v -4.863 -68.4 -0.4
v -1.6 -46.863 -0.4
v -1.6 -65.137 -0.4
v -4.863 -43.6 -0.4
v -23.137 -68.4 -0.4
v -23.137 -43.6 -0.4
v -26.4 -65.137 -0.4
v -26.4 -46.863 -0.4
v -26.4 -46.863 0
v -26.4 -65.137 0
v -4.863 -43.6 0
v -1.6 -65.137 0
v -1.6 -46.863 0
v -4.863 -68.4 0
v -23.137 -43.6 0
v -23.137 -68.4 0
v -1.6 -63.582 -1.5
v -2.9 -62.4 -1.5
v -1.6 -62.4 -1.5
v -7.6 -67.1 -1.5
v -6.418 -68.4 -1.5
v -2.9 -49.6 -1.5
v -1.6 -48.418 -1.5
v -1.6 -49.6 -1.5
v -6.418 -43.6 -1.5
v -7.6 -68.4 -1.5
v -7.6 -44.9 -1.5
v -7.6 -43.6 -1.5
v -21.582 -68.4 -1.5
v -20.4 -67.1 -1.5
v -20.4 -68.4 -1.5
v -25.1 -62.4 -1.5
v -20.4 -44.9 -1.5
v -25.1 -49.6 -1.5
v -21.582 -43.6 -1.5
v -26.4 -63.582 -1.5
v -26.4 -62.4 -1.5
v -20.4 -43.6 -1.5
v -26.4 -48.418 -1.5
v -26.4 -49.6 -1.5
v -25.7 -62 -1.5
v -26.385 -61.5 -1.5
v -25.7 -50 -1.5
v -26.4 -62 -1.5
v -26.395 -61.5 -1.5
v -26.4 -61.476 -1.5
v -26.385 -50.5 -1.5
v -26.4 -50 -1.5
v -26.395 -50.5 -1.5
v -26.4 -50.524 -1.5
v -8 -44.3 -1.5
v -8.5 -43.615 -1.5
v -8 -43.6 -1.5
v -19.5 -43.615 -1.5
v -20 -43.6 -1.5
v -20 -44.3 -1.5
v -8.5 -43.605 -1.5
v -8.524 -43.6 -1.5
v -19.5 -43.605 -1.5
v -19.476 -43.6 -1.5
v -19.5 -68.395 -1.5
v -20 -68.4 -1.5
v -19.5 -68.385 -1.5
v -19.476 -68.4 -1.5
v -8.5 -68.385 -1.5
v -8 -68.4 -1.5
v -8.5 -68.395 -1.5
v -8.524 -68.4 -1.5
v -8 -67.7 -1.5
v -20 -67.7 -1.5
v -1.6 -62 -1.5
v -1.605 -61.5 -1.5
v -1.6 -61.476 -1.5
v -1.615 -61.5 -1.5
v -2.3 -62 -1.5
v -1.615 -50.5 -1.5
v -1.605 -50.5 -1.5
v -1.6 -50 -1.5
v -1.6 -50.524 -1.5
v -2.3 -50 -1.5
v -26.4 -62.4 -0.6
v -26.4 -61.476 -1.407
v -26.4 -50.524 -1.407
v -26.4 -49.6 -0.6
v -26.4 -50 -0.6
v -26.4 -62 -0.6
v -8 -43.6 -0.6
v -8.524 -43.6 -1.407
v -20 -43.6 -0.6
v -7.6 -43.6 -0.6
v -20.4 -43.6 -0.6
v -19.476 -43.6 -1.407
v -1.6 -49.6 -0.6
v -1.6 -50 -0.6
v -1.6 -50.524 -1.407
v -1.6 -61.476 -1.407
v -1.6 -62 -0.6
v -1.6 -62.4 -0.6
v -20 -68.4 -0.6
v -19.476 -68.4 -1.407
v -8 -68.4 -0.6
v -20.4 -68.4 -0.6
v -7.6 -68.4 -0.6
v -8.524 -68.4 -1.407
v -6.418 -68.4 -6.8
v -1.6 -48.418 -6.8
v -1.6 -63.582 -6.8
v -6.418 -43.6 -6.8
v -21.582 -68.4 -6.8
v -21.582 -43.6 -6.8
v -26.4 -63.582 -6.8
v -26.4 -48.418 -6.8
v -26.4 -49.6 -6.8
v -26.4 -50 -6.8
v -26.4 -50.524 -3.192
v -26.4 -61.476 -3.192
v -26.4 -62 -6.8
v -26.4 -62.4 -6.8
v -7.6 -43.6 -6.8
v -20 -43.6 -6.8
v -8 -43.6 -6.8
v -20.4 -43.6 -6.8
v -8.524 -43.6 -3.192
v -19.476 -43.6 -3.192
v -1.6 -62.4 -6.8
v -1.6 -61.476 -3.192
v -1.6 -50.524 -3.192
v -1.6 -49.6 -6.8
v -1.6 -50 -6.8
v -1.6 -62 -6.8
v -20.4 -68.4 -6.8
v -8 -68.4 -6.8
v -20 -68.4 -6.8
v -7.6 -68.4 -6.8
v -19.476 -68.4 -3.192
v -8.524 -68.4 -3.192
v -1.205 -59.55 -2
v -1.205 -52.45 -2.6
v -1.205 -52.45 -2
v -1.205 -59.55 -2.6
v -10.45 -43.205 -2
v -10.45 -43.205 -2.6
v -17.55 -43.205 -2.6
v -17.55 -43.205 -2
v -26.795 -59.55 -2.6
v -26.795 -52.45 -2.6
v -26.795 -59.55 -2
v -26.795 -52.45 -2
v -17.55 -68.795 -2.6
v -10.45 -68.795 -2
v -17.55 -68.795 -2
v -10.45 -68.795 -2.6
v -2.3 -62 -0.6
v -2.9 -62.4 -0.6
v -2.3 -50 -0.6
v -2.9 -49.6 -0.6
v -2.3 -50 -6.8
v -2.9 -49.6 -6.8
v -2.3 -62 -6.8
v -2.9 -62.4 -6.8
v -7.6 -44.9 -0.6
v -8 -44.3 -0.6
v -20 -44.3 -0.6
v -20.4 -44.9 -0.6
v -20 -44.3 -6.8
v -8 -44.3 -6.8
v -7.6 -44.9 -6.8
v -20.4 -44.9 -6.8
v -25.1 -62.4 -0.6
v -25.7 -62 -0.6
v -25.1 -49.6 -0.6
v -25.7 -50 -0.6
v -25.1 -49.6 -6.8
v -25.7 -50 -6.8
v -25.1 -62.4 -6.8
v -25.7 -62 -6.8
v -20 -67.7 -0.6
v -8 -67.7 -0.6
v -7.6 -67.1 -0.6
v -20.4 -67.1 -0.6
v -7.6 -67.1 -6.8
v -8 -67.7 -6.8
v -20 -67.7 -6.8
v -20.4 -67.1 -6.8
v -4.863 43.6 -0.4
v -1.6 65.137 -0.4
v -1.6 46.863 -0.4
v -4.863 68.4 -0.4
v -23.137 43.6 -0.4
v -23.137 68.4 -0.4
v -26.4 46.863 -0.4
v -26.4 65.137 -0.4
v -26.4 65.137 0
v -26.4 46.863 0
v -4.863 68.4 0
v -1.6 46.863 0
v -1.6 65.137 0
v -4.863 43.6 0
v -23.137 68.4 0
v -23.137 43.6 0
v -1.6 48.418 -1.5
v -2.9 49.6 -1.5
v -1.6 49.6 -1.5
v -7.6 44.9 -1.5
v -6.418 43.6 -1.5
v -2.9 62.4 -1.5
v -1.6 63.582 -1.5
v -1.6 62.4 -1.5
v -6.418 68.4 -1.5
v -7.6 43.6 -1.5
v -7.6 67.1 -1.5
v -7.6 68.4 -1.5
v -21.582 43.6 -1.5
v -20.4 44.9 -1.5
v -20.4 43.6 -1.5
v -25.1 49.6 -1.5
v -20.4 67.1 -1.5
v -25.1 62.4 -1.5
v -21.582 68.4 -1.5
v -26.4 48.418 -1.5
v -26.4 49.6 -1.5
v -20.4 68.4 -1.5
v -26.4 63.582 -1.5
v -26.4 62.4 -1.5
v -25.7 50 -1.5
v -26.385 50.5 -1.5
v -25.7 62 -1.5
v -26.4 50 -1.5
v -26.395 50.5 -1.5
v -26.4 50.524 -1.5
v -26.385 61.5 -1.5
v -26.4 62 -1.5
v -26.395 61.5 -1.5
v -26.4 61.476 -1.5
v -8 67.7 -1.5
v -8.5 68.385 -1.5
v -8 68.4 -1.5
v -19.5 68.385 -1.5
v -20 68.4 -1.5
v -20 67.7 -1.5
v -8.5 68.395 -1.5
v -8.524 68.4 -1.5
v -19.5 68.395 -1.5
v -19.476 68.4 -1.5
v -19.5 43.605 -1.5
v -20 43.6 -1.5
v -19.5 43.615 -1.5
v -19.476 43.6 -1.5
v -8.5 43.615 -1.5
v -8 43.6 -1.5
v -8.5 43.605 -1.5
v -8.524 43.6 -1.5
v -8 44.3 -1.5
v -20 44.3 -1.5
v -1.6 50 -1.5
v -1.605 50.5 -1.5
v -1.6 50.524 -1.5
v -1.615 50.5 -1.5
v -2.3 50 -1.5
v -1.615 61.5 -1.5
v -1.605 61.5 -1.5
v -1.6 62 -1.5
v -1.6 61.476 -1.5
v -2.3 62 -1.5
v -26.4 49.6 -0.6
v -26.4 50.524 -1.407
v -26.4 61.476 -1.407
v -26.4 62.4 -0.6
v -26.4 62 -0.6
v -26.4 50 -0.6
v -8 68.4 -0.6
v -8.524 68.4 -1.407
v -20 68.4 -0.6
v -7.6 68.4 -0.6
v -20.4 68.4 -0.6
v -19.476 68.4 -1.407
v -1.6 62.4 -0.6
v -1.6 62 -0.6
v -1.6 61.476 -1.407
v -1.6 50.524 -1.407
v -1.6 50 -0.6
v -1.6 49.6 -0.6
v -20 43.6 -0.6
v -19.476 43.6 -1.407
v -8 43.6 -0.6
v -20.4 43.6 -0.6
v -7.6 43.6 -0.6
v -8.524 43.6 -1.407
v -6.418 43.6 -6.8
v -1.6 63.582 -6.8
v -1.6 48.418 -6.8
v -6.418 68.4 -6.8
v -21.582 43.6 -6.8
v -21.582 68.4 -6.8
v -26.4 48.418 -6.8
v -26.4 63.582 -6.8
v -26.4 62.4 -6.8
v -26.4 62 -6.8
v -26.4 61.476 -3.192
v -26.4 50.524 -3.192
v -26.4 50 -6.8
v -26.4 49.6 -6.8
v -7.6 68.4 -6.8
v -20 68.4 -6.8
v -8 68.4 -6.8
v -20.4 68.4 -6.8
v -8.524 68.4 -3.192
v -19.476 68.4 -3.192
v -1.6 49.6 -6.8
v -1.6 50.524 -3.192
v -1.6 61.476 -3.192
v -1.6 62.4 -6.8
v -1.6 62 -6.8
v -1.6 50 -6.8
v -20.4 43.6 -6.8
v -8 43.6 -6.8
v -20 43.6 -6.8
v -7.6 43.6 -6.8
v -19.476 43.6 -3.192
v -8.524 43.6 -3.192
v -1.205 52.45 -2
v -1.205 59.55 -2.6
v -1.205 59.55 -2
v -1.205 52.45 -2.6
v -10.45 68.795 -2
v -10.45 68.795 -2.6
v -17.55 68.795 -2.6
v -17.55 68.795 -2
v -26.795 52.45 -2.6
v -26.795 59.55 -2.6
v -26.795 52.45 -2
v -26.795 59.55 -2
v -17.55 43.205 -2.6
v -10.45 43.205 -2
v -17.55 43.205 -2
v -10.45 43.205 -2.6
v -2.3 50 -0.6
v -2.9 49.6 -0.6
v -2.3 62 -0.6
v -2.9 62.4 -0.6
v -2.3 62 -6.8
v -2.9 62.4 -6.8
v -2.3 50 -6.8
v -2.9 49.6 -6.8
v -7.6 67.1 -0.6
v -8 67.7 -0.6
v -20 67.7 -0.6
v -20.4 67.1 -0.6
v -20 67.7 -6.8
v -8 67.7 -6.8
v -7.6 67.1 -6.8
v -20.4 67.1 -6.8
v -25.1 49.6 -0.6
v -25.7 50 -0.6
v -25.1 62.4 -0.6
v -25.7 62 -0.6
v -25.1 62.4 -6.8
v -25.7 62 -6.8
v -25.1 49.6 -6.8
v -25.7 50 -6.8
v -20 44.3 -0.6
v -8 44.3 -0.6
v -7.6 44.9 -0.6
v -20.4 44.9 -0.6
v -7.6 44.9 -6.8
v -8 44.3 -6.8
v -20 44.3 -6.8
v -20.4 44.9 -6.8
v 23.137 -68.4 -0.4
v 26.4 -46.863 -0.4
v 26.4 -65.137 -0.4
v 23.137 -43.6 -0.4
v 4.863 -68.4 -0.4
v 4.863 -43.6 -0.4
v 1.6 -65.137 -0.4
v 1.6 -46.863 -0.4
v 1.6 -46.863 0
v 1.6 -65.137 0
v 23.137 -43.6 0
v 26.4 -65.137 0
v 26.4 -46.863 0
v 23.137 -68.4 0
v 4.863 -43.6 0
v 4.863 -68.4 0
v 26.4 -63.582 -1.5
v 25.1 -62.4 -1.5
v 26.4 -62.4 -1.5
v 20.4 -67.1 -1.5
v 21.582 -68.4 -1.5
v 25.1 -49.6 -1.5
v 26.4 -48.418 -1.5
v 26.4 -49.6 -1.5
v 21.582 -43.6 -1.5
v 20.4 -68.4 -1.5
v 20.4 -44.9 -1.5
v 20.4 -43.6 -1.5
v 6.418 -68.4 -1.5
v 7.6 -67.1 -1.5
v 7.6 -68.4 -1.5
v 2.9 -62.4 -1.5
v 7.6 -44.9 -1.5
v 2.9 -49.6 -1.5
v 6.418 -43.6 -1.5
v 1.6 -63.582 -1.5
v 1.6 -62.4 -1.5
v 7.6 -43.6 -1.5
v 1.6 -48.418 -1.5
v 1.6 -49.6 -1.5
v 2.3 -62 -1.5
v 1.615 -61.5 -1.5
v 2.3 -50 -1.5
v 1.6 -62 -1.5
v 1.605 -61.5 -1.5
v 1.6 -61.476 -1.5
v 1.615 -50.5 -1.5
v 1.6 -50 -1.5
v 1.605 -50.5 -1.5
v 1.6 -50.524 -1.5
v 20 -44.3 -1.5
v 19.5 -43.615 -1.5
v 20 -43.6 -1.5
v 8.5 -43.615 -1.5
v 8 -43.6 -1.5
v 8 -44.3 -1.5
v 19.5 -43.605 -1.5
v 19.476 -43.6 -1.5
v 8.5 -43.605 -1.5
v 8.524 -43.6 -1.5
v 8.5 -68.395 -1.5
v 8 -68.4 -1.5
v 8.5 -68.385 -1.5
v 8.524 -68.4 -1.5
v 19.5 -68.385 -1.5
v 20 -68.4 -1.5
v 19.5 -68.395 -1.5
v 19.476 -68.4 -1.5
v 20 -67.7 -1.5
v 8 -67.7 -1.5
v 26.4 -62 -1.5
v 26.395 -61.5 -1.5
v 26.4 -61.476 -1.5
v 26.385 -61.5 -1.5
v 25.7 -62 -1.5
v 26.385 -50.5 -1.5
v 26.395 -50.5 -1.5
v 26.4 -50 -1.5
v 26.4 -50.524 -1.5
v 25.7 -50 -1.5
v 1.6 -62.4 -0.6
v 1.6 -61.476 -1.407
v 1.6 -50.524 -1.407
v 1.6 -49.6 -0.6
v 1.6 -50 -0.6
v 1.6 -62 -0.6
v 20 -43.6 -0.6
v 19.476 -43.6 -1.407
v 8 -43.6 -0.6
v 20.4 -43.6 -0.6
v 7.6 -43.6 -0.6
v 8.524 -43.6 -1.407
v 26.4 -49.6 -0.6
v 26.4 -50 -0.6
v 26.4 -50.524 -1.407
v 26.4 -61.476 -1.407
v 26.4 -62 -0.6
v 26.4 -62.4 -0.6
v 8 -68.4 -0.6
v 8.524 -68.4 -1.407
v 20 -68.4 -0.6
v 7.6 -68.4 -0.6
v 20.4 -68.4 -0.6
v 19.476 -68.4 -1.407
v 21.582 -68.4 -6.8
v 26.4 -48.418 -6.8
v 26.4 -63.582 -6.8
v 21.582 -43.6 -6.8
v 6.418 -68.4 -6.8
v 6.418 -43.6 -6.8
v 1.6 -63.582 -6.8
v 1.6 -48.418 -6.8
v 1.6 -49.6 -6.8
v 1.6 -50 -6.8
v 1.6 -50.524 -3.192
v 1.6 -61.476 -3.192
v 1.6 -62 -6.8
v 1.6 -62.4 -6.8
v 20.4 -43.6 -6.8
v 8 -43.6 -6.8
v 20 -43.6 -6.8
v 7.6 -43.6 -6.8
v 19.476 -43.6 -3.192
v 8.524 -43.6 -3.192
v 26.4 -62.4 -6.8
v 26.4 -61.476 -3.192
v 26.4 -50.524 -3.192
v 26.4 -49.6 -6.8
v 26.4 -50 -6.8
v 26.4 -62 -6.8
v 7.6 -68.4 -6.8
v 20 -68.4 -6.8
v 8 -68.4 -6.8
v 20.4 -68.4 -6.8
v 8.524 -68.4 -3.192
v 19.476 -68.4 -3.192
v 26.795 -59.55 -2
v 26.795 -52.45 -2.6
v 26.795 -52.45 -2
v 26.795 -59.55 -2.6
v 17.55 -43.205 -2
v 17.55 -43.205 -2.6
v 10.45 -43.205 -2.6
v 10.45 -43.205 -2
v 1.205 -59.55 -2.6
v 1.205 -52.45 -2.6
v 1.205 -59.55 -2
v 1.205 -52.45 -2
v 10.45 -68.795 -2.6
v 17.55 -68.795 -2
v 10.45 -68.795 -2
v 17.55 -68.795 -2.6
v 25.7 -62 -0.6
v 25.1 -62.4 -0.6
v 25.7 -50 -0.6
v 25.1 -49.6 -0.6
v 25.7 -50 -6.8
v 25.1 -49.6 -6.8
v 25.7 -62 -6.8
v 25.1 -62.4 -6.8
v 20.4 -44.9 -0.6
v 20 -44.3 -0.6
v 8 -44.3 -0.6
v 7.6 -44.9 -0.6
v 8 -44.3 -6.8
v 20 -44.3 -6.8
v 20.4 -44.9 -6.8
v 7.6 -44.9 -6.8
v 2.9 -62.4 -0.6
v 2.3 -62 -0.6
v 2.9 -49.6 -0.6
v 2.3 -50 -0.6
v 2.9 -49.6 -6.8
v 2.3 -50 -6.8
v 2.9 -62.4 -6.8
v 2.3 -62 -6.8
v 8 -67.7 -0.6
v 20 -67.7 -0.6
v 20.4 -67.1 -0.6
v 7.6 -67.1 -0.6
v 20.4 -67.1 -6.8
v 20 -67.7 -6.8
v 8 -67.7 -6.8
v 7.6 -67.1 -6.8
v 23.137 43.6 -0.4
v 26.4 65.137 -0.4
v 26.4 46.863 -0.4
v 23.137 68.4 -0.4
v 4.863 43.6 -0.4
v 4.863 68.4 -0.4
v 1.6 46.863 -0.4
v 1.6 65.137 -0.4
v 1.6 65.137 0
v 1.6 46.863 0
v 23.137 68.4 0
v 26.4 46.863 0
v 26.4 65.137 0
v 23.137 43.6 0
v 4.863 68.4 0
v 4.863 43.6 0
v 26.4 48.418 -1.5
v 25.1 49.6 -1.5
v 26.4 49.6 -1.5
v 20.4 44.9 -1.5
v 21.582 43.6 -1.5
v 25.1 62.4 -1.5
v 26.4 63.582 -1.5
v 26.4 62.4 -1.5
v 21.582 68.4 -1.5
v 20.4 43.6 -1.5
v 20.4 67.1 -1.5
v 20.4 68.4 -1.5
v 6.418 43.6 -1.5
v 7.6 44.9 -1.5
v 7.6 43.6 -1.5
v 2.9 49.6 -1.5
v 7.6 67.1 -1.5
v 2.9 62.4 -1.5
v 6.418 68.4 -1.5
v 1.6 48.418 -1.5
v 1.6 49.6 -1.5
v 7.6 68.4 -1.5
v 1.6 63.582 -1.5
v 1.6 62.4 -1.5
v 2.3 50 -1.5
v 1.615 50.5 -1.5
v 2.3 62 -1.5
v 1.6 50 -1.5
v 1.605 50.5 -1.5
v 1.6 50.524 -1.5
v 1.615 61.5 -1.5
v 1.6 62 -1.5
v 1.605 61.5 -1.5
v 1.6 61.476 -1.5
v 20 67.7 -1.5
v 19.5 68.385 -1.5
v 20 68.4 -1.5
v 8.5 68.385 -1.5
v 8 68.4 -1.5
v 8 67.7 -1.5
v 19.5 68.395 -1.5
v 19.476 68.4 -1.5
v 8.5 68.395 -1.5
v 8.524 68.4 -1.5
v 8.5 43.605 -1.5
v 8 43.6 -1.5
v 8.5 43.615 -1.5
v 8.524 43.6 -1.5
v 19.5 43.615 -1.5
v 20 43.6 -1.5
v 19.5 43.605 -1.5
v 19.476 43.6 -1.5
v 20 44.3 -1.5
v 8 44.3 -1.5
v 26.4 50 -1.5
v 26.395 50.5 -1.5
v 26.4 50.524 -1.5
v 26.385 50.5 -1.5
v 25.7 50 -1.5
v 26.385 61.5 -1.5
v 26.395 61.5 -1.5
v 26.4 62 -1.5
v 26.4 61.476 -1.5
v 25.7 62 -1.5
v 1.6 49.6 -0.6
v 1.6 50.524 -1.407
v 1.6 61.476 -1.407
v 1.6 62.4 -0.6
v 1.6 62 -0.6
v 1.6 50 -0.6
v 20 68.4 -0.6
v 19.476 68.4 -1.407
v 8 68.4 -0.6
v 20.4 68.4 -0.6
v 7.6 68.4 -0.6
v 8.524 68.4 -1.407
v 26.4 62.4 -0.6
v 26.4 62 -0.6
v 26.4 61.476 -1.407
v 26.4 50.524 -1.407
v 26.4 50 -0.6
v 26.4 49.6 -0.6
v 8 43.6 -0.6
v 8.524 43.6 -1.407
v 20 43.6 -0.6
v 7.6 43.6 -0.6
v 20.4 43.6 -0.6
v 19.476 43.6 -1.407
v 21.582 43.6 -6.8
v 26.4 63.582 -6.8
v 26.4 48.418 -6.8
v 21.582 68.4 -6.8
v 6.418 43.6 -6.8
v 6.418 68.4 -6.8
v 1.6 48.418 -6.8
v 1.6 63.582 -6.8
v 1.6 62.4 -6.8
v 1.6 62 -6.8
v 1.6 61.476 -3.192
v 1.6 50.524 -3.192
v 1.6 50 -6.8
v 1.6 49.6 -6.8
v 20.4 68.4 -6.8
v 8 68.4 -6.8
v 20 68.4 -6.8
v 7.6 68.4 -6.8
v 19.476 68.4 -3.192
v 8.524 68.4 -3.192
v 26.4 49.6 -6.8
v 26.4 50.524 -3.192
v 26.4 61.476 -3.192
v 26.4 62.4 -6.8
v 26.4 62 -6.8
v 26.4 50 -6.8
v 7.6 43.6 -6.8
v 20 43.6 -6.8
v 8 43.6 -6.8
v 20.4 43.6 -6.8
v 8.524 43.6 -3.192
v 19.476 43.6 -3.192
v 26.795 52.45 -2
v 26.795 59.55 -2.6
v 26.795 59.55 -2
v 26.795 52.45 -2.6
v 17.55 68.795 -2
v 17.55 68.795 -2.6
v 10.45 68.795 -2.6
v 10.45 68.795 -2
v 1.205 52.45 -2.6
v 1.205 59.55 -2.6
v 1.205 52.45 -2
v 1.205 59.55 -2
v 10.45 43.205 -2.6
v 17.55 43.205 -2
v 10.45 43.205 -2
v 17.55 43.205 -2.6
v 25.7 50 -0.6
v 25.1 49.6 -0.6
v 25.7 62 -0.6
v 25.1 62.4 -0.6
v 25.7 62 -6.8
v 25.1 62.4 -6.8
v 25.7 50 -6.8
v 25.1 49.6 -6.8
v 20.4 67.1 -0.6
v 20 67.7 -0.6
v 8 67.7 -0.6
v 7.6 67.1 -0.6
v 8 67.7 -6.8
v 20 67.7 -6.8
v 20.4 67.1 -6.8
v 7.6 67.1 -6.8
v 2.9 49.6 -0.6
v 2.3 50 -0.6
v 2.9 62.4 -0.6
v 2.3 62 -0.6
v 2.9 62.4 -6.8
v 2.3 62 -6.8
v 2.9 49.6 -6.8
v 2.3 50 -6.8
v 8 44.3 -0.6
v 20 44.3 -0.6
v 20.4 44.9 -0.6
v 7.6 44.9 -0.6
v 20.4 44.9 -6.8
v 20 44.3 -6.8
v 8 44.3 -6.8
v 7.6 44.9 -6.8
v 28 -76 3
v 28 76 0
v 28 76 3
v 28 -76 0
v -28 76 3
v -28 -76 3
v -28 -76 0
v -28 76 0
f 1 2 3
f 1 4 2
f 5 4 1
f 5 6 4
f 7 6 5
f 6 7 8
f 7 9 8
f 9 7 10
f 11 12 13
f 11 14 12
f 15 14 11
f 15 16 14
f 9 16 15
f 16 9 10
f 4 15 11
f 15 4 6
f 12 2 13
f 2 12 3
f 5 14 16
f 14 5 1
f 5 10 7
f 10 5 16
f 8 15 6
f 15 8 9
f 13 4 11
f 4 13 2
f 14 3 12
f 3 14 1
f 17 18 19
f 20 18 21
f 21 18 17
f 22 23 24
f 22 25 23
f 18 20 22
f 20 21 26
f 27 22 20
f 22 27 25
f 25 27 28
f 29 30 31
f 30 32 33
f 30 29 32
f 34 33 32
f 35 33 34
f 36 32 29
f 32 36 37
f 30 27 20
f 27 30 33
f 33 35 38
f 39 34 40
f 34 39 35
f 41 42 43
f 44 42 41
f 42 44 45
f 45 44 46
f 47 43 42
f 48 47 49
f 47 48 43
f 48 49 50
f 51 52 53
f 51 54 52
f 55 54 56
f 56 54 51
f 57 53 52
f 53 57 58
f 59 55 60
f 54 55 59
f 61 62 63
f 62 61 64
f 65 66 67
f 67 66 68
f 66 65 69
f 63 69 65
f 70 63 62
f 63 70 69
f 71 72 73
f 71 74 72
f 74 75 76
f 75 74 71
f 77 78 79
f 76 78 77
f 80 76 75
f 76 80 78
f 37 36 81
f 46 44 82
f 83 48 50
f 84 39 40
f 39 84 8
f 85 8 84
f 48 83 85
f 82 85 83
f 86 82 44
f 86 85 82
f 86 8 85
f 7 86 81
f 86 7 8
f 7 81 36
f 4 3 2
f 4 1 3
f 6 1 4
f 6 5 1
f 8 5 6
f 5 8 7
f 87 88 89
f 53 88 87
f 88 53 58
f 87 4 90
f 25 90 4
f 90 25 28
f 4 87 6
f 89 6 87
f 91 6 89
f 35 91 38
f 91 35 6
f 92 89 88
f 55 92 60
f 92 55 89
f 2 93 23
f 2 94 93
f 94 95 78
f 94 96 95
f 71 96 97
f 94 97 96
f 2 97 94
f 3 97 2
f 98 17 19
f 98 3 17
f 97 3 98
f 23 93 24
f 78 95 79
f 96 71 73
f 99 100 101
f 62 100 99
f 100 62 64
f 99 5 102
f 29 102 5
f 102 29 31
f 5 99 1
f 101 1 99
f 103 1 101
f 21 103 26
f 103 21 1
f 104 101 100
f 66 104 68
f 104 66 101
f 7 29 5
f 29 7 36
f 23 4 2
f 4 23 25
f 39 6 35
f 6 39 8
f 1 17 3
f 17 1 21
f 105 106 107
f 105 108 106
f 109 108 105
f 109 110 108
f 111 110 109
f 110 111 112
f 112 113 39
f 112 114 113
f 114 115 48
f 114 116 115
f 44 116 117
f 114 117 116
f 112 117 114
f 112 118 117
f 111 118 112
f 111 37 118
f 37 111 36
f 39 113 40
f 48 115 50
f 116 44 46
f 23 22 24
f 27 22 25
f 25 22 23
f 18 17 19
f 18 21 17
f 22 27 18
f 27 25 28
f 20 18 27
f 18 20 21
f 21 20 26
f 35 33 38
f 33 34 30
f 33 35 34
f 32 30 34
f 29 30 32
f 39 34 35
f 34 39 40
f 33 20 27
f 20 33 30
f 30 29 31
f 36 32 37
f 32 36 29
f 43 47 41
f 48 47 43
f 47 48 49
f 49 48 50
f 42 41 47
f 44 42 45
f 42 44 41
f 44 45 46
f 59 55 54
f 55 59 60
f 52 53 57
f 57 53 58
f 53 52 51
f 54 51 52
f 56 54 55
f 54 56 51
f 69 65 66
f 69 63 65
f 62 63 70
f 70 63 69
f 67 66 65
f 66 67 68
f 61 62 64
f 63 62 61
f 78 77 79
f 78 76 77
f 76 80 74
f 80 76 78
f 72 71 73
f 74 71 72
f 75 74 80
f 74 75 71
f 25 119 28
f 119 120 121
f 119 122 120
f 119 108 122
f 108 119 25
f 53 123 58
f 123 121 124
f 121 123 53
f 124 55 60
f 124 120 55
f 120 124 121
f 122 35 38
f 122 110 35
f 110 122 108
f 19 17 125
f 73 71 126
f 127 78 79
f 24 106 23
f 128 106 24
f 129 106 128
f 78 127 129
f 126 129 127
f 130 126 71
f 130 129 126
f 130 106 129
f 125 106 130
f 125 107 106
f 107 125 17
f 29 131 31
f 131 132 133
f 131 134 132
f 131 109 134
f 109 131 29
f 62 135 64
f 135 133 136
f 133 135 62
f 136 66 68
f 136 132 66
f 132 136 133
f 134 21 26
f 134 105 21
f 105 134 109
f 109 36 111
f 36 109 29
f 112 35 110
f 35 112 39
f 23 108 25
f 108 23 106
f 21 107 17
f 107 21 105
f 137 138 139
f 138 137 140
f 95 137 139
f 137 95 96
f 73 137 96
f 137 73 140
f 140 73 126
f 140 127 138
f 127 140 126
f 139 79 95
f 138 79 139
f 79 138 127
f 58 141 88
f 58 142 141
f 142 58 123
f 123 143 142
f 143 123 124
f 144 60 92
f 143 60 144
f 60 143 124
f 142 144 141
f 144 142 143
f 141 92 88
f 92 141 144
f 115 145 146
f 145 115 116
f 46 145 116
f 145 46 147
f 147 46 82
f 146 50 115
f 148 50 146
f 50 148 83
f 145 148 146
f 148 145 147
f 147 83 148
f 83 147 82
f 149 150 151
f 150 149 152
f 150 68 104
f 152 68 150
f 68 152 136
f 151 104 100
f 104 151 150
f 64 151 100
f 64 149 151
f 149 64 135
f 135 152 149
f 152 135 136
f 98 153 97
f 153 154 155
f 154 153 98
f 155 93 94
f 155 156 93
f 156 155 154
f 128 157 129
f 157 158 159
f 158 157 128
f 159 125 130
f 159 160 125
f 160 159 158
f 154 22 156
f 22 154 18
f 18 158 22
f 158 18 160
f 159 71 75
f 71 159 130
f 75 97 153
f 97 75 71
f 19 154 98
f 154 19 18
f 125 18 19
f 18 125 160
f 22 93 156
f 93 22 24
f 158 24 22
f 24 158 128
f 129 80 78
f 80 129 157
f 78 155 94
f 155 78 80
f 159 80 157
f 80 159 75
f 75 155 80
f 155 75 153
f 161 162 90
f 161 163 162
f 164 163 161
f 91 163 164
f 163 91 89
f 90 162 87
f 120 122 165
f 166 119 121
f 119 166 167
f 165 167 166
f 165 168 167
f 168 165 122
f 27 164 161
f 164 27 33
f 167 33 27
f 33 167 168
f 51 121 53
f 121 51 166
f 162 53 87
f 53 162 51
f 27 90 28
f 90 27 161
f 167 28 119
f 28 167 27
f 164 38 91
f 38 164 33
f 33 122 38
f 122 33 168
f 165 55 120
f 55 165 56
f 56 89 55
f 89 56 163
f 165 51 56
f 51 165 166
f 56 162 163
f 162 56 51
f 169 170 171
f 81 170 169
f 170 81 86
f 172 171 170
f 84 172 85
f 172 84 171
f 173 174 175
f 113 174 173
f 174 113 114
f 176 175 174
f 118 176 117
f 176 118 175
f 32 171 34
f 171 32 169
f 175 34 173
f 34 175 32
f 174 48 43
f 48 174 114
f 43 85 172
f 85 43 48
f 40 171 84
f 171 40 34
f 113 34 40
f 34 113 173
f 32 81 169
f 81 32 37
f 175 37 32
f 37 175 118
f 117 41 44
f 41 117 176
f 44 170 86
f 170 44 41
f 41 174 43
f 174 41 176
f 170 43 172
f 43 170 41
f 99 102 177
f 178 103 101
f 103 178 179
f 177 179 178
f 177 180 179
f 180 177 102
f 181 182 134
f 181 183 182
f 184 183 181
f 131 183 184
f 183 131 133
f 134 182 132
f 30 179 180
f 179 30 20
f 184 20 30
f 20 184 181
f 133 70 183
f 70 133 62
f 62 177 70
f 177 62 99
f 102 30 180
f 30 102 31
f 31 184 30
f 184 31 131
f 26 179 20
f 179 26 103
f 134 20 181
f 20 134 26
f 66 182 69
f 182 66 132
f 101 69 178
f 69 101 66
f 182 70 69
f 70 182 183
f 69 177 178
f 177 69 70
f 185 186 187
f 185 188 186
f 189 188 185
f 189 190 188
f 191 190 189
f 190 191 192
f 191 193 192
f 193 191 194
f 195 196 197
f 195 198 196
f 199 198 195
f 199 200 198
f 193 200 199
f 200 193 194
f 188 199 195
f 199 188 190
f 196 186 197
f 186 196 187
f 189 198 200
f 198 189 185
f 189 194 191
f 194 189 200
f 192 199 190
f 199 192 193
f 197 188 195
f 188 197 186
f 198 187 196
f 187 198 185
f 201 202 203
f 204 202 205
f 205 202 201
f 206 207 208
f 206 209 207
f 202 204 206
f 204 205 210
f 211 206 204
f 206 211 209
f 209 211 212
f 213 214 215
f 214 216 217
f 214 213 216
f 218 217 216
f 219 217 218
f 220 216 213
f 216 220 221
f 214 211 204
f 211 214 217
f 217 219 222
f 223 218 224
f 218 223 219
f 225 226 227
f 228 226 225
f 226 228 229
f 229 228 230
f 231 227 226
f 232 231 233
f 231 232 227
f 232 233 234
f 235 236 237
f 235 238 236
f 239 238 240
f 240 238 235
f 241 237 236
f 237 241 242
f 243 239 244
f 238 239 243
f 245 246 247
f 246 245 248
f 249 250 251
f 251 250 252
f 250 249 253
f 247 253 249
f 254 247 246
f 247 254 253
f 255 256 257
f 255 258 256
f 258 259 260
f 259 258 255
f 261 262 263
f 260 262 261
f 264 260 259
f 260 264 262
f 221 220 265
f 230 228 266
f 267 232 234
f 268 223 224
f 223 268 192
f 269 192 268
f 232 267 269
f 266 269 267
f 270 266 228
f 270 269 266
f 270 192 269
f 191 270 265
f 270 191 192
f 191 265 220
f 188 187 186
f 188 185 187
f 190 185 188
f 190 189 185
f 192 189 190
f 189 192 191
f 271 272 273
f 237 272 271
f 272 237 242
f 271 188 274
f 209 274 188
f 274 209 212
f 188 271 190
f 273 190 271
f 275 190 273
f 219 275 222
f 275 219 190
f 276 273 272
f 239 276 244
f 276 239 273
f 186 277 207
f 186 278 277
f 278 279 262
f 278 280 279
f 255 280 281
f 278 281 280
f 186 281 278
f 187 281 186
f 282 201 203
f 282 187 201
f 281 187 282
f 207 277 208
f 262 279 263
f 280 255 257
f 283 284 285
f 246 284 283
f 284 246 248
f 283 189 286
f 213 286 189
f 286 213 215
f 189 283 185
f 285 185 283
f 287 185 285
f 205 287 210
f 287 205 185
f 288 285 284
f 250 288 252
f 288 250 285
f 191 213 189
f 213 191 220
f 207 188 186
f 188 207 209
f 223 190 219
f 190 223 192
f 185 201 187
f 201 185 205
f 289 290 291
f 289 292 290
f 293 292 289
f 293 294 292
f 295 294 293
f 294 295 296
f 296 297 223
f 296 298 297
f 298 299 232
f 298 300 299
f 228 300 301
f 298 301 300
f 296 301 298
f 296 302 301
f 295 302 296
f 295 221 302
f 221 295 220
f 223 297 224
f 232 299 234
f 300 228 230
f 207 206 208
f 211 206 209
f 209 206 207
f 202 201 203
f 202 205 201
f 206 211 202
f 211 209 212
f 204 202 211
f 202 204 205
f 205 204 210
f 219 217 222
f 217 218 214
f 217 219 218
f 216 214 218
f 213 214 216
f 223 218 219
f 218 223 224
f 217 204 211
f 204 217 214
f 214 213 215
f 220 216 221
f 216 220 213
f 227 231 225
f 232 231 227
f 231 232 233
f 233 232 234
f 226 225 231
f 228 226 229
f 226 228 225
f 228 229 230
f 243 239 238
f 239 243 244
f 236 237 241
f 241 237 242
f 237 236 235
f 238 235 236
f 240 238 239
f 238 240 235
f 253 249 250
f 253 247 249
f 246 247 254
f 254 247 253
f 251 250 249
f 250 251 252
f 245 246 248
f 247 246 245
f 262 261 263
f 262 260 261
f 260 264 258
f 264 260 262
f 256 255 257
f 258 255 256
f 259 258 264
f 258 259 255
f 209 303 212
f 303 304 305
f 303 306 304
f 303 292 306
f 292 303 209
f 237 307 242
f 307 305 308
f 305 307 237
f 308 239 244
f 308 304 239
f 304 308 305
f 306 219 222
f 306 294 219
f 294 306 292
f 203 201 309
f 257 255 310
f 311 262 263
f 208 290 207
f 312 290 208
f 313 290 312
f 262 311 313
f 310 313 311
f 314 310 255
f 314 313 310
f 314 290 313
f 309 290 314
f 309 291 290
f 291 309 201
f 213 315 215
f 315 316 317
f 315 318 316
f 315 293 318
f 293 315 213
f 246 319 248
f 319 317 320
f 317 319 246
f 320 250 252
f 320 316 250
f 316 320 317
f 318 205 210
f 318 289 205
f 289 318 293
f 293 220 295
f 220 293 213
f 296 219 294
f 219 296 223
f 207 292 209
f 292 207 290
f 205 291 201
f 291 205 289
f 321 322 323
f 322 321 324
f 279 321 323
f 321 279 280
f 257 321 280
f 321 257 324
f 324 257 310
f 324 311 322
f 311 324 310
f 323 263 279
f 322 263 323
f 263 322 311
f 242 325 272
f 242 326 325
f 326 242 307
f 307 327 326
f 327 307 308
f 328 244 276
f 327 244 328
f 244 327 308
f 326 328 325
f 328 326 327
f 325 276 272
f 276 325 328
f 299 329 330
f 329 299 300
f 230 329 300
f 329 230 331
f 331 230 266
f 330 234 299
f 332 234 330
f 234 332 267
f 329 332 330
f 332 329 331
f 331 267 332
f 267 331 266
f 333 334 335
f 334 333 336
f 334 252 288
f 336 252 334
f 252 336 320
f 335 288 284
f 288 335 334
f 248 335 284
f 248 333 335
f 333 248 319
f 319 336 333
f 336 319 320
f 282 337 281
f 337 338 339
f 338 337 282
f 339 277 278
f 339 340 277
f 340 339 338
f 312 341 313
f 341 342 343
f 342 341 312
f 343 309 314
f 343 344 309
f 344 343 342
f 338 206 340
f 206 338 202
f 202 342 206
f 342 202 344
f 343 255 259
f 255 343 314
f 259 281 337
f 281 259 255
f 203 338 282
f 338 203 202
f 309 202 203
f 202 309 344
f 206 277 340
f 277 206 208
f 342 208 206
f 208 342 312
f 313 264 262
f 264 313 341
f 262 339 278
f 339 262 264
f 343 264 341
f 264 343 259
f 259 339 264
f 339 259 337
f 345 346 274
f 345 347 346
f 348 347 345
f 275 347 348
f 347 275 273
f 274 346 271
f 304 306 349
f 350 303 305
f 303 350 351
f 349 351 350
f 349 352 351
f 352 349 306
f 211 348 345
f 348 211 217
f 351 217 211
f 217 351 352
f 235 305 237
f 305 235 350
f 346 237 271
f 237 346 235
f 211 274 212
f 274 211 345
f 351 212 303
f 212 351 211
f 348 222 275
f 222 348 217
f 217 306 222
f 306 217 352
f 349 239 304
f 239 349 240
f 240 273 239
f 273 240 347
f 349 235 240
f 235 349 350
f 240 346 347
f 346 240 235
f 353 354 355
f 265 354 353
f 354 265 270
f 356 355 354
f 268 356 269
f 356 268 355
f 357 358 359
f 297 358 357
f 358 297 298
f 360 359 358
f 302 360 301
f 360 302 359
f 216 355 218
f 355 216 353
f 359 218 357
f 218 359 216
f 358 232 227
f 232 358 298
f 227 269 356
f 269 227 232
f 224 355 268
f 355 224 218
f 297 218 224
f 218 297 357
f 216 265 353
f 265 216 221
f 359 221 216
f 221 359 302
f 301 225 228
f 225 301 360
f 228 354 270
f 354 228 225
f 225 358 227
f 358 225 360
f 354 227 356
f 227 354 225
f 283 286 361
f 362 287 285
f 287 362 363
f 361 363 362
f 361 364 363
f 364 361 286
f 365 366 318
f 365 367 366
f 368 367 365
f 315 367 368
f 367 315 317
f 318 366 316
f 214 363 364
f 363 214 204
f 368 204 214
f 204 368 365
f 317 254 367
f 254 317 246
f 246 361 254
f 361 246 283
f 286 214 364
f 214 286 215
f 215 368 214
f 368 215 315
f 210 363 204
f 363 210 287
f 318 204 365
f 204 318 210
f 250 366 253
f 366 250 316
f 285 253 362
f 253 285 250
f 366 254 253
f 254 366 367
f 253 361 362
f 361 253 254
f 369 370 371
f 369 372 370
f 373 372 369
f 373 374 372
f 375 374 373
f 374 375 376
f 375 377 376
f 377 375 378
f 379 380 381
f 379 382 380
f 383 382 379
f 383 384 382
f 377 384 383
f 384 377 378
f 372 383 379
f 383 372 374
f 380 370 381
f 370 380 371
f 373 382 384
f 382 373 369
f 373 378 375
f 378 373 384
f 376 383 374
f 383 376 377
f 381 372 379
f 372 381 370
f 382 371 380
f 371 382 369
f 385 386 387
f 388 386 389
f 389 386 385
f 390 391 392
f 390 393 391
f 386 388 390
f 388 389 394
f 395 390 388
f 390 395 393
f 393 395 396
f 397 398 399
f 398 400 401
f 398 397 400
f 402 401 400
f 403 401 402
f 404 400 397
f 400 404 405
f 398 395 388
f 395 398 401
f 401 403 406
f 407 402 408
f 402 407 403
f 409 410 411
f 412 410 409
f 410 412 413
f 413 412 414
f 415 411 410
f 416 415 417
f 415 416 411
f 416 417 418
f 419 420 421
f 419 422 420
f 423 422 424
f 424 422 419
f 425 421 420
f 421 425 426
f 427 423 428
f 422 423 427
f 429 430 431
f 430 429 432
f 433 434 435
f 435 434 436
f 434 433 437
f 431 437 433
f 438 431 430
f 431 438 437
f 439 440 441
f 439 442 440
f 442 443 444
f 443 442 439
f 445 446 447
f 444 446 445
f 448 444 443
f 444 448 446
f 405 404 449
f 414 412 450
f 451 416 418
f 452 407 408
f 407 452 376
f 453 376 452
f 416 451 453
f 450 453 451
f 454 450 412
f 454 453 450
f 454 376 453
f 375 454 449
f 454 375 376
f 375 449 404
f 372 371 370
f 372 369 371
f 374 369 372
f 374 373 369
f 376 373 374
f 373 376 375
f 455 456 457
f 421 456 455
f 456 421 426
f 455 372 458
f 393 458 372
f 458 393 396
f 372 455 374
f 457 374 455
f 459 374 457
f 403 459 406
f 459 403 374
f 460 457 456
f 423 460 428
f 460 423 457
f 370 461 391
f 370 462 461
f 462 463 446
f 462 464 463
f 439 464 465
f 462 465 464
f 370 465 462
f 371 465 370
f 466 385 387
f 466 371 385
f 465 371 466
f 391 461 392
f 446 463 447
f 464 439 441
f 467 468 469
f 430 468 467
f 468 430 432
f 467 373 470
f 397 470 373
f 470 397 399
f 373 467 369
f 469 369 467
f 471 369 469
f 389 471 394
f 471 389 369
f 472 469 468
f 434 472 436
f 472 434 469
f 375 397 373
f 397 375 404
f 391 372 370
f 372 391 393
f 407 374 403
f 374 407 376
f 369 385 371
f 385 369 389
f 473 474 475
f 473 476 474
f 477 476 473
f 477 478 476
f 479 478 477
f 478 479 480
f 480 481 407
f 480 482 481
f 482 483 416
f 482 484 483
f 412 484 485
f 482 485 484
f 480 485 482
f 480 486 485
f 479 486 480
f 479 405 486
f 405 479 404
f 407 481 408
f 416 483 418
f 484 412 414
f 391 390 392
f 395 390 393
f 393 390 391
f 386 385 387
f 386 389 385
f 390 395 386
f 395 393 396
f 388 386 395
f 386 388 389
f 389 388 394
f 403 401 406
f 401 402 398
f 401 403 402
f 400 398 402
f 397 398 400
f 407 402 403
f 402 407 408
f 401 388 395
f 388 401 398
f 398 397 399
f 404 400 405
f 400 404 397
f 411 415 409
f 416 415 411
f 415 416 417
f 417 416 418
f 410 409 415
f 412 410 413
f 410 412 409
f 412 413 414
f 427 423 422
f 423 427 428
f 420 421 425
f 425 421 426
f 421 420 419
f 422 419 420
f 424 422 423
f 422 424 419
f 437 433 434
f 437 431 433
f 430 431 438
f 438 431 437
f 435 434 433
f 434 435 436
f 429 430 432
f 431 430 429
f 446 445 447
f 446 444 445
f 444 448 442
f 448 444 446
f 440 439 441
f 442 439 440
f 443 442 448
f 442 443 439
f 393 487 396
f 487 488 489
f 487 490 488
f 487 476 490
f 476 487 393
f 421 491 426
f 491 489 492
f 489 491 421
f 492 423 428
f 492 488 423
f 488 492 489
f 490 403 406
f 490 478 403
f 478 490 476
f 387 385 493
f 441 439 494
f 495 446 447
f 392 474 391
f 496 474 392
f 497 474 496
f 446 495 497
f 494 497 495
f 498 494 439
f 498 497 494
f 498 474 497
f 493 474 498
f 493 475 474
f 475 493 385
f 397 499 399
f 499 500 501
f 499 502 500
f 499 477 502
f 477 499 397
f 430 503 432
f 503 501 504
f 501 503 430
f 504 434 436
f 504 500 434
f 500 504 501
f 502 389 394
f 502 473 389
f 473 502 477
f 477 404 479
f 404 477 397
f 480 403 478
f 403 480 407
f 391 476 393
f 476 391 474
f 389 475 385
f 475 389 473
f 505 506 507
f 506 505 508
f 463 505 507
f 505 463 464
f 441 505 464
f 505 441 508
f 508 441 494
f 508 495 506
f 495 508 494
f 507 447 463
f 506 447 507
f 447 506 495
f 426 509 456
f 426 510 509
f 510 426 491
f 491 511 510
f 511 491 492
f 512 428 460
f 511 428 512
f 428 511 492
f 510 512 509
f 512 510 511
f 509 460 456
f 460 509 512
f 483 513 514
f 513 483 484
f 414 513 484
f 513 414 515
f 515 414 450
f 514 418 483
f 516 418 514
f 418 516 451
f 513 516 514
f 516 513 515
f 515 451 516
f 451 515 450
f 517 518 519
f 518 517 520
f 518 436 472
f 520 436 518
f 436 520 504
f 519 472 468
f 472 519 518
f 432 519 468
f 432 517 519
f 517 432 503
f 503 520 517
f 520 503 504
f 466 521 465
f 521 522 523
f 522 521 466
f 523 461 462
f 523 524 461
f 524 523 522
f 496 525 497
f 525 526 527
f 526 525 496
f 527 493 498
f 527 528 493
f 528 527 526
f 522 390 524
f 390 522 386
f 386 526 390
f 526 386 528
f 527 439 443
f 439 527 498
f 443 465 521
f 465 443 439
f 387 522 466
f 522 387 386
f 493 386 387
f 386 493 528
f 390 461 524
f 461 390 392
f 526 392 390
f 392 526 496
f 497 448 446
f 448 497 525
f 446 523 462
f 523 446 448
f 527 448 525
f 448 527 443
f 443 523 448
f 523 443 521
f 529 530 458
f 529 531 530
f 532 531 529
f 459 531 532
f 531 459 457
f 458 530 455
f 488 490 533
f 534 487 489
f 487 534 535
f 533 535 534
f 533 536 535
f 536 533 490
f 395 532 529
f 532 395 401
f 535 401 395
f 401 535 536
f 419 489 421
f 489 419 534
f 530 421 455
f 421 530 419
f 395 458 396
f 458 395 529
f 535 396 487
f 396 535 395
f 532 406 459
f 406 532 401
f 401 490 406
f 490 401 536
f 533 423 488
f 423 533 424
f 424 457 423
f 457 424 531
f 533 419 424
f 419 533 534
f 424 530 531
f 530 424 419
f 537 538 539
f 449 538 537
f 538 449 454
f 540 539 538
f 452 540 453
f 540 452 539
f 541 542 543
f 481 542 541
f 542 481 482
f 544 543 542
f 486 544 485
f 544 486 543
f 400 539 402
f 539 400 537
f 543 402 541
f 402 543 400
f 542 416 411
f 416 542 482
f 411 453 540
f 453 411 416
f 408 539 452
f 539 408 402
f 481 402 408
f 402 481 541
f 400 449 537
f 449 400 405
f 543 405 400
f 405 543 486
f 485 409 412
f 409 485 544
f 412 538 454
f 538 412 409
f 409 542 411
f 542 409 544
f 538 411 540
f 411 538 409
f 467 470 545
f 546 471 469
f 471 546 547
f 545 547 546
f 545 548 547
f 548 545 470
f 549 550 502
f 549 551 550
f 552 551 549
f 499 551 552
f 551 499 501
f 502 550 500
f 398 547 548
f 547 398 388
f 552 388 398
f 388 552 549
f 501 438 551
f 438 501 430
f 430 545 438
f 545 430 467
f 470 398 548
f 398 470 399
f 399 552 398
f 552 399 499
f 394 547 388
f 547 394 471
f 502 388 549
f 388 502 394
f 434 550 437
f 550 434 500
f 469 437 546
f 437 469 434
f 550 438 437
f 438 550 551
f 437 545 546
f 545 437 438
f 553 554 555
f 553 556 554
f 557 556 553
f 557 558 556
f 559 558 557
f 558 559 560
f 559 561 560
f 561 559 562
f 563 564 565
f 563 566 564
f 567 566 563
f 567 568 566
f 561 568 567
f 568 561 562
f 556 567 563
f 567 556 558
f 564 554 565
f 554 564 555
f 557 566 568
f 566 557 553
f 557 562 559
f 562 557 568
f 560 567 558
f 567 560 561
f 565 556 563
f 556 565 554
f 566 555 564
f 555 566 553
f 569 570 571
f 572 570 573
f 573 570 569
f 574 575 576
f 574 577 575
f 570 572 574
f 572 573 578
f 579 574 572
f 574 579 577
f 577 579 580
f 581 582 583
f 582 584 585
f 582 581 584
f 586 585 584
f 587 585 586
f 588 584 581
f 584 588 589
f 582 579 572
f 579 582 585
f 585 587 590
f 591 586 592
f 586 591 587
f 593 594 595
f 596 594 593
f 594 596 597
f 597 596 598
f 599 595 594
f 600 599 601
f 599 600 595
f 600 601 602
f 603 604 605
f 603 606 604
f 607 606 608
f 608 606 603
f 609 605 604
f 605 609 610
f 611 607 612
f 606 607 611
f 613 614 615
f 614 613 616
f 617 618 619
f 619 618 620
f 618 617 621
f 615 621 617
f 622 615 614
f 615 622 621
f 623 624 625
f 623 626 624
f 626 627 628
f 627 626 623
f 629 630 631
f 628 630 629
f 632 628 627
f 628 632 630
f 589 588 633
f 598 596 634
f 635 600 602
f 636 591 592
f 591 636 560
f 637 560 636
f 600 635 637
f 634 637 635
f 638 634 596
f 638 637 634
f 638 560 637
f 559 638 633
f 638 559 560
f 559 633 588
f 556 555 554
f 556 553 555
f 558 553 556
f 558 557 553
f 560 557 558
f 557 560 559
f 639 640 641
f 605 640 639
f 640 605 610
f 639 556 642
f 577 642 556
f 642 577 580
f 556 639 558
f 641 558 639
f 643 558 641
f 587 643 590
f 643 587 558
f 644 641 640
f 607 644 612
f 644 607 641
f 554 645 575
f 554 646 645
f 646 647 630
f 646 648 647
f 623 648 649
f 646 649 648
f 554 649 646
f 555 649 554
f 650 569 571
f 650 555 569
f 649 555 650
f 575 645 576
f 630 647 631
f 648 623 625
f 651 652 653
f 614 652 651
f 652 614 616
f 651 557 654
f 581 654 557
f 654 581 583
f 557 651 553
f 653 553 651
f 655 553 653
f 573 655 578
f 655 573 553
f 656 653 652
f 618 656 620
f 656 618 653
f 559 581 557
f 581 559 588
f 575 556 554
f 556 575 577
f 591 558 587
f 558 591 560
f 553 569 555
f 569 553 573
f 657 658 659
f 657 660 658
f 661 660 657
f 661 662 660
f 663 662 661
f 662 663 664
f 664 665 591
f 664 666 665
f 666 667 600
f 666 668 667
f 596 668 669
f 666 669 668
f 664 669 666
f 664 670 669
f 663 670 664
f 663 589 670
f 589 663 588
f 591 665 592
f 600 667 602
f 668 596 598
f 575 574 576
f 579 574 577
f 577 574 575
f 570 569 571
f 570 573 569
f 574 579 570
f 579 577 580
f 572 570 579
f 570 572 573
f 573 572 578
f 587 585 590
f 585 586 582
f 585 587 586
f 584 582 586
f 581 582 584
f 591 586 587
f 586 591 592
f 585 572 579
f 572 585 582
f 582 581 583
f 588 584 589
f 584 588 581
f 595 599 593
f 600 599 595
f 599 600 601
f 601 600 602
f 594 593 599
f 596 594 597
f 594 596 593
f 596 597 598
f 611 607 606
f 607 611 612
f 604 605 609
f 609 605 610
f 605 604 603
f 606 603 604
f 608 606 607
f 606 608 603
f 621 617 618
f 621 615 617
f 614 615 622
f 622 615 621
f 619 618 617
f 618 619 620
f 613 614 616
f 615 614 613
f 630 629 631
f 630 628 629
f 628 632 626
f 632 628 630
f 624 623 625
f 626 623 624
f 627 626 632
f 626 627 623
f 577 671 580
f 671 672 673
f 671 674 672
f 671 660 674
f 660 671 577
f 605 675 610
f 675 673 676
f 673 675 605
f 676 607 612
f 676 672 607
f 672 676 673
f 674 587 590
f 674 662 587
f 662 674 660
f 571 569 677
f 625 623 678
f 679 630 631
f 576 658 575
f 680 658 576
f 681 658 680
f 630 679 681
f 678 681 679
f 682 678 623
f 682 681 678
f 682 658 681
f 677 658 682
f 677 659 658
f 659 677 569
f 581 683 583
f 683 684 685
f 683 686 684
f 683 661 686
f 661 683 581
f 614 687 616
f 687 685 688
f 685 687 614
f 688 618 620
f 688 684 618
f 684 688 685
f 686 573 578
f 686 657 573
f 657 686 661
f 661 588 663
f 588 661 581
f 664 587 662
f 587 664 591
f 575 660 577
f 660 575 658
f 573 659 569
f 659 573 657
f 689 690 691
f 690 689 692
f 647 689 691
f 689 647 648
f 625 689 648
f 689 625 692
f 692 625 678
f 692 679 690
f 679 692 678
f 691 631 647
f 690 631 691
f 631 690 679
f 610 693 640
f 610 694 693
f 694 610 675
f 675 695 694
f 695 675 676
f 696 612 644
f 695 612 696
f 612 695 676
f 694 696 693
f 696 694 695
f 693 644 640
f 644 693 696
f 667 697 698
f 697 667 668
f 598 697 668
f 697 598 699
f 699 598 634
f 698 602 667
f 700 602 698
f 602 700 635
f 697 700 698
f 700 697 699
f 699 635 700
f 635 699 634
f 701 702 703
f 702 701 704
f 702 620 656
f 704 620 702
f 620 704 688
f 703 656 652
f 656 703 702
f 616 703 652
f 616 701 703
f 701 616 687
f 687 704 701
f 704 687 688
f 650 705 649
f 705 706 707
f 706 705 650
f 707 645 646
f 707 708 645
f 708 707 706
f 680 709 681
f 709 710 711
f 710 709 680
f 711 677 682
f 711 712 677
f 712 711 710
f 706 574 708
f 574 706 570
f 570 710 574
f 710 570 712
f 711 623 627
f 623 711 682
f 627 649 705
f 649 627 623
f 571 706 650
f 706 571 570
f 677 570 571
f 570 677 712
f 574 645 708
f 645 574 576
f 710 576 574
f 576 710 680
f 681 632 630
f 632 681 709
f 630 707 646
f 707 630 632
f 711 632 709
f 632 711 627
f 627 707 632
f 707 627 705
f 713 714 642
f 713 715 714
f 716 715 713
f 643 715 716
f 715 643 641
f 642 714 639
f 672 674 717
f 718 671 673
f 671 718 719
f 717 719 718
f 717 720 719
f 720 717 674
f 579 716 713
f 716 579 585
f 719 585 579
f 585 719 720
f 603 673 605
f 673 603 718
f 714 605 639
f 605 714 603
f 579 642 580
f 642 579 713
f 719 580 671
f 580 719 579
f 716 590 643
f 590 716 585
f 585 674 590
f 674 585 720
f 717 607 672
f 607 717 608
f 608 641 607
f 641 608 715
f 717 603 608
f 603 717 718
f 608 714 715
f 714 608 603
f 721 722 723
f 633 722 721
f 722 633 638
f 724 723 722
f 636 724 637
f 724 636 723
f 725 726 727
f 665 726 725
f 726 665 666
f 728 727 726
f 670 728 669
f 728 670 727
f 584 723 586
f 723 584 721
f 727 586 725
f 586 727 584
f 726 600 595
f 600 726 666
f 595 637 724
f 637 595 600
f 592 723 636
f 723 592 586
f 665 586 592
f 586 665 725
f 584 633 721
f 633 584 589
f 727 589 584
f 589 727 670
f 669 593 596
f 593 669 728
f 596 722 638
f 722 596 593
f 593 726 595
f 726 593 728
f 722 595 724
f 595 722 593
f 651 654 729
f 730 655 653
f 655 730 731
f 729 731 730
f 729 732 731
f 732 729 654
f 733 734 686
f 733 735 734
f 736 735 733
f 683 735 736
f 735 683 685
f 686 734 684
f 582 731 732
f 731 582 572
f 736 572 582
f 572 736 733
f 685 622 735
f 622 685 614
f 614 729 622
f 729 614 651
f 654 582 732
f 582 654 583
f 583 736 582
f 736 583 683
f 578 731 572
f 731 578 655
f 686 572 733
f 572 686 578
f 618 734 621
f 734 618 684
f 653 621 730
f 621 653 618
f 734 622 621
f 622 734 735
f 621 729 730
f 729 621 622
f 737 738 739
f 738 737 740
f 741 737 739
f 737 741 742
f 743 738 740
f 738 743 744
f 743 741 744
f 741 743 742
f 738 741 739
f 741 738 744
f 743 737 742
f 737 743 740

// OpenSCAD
// opengrid_plate_example.scad -- typical use: a product backplate that carries
// snaps only at its top and bottom rows
include <../opengrid.scad>

plate_w = og_span(2);   // 56
plate_h = 152;
plate_t = 3;

// snap centres must land on the 28 mm grid and keep 14 mm clear of the edges
rows_apart = floor((plate_h - 28) / OG_PITCH) * OG_PITCH;   // 112
y0 = (plate_h - rows_apart) / 2;                            // 20

positions = [ for (x = [-1, 1], y = [y0, plate_h - y0])
                [x * OG_PITCH / 2, y - plate_h / 2] ];

color("steelblue")
    translate([-plate_w / 2, -plate_h / 2, 0]) cube([plate_w, plate_h, plate_t]);
color("orangered") opengrid_snaps(positions);
